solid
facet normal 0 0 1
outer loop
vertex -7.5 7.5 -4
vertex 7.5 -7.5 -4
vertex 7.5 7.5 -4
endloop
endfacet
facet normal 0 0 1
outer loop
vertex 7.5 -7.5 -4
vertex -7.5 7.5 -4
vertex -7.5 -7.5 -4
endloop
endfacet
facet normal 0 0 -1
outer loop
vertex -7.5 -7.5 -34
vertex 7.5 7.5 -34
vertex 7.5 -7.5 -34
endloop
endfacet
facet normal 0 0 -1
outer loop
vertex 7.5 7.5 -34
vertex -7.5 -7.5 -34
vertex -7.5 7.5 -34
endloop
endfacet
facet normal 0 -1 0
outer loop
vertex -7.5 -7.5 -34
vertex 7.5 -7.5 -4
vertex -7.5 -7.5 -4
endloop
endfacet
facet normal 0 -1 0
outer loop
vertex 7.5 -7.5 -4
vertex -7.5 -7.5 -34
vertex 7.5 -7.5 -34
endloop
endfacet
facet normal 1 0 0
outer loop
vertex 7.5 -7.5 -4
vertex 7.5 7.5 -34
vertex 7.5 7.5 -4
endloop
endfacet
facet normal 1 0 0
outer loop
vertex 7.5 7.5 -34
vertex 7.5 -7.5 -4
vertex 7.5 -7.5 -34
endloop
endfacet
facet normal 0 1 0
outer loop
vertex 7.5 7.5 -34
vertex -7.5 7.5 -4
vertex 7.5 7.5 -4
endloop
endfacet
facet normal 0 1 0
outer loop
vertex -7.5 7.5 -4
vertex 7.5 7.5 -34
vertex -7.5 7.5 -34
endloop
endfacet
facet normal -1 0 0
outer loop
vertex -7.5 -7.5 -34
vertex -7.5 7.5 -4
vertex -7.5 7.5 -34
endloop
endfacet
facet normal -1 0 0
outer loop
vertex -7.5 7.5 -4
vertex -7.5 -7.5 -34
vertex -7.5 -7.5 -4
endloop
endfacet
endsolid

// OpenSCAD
handle_length = 30;

x_target = 15;
y_target = 15;
z_target = 4;

x_pic = 500;
y_pic = 499;
z_pic = 100;

x_scale = x_target/x_pic;
echo("x_scale: ", x_scale);

y_scale = y_target/y_pic;
echo("y_scale: ", y_scale);

z_scale = z_target/z_pic;
echo("z_scale: ", z_scale);

scale([x_scale, y_scale, z_scale])
    surface( file = "virus-2-500x499.png", center = true, invert = true);
    
translate([0, 0, -z_target-handle_length/2])
    cube([x_target, y_target, handle_length], center = true);
    
